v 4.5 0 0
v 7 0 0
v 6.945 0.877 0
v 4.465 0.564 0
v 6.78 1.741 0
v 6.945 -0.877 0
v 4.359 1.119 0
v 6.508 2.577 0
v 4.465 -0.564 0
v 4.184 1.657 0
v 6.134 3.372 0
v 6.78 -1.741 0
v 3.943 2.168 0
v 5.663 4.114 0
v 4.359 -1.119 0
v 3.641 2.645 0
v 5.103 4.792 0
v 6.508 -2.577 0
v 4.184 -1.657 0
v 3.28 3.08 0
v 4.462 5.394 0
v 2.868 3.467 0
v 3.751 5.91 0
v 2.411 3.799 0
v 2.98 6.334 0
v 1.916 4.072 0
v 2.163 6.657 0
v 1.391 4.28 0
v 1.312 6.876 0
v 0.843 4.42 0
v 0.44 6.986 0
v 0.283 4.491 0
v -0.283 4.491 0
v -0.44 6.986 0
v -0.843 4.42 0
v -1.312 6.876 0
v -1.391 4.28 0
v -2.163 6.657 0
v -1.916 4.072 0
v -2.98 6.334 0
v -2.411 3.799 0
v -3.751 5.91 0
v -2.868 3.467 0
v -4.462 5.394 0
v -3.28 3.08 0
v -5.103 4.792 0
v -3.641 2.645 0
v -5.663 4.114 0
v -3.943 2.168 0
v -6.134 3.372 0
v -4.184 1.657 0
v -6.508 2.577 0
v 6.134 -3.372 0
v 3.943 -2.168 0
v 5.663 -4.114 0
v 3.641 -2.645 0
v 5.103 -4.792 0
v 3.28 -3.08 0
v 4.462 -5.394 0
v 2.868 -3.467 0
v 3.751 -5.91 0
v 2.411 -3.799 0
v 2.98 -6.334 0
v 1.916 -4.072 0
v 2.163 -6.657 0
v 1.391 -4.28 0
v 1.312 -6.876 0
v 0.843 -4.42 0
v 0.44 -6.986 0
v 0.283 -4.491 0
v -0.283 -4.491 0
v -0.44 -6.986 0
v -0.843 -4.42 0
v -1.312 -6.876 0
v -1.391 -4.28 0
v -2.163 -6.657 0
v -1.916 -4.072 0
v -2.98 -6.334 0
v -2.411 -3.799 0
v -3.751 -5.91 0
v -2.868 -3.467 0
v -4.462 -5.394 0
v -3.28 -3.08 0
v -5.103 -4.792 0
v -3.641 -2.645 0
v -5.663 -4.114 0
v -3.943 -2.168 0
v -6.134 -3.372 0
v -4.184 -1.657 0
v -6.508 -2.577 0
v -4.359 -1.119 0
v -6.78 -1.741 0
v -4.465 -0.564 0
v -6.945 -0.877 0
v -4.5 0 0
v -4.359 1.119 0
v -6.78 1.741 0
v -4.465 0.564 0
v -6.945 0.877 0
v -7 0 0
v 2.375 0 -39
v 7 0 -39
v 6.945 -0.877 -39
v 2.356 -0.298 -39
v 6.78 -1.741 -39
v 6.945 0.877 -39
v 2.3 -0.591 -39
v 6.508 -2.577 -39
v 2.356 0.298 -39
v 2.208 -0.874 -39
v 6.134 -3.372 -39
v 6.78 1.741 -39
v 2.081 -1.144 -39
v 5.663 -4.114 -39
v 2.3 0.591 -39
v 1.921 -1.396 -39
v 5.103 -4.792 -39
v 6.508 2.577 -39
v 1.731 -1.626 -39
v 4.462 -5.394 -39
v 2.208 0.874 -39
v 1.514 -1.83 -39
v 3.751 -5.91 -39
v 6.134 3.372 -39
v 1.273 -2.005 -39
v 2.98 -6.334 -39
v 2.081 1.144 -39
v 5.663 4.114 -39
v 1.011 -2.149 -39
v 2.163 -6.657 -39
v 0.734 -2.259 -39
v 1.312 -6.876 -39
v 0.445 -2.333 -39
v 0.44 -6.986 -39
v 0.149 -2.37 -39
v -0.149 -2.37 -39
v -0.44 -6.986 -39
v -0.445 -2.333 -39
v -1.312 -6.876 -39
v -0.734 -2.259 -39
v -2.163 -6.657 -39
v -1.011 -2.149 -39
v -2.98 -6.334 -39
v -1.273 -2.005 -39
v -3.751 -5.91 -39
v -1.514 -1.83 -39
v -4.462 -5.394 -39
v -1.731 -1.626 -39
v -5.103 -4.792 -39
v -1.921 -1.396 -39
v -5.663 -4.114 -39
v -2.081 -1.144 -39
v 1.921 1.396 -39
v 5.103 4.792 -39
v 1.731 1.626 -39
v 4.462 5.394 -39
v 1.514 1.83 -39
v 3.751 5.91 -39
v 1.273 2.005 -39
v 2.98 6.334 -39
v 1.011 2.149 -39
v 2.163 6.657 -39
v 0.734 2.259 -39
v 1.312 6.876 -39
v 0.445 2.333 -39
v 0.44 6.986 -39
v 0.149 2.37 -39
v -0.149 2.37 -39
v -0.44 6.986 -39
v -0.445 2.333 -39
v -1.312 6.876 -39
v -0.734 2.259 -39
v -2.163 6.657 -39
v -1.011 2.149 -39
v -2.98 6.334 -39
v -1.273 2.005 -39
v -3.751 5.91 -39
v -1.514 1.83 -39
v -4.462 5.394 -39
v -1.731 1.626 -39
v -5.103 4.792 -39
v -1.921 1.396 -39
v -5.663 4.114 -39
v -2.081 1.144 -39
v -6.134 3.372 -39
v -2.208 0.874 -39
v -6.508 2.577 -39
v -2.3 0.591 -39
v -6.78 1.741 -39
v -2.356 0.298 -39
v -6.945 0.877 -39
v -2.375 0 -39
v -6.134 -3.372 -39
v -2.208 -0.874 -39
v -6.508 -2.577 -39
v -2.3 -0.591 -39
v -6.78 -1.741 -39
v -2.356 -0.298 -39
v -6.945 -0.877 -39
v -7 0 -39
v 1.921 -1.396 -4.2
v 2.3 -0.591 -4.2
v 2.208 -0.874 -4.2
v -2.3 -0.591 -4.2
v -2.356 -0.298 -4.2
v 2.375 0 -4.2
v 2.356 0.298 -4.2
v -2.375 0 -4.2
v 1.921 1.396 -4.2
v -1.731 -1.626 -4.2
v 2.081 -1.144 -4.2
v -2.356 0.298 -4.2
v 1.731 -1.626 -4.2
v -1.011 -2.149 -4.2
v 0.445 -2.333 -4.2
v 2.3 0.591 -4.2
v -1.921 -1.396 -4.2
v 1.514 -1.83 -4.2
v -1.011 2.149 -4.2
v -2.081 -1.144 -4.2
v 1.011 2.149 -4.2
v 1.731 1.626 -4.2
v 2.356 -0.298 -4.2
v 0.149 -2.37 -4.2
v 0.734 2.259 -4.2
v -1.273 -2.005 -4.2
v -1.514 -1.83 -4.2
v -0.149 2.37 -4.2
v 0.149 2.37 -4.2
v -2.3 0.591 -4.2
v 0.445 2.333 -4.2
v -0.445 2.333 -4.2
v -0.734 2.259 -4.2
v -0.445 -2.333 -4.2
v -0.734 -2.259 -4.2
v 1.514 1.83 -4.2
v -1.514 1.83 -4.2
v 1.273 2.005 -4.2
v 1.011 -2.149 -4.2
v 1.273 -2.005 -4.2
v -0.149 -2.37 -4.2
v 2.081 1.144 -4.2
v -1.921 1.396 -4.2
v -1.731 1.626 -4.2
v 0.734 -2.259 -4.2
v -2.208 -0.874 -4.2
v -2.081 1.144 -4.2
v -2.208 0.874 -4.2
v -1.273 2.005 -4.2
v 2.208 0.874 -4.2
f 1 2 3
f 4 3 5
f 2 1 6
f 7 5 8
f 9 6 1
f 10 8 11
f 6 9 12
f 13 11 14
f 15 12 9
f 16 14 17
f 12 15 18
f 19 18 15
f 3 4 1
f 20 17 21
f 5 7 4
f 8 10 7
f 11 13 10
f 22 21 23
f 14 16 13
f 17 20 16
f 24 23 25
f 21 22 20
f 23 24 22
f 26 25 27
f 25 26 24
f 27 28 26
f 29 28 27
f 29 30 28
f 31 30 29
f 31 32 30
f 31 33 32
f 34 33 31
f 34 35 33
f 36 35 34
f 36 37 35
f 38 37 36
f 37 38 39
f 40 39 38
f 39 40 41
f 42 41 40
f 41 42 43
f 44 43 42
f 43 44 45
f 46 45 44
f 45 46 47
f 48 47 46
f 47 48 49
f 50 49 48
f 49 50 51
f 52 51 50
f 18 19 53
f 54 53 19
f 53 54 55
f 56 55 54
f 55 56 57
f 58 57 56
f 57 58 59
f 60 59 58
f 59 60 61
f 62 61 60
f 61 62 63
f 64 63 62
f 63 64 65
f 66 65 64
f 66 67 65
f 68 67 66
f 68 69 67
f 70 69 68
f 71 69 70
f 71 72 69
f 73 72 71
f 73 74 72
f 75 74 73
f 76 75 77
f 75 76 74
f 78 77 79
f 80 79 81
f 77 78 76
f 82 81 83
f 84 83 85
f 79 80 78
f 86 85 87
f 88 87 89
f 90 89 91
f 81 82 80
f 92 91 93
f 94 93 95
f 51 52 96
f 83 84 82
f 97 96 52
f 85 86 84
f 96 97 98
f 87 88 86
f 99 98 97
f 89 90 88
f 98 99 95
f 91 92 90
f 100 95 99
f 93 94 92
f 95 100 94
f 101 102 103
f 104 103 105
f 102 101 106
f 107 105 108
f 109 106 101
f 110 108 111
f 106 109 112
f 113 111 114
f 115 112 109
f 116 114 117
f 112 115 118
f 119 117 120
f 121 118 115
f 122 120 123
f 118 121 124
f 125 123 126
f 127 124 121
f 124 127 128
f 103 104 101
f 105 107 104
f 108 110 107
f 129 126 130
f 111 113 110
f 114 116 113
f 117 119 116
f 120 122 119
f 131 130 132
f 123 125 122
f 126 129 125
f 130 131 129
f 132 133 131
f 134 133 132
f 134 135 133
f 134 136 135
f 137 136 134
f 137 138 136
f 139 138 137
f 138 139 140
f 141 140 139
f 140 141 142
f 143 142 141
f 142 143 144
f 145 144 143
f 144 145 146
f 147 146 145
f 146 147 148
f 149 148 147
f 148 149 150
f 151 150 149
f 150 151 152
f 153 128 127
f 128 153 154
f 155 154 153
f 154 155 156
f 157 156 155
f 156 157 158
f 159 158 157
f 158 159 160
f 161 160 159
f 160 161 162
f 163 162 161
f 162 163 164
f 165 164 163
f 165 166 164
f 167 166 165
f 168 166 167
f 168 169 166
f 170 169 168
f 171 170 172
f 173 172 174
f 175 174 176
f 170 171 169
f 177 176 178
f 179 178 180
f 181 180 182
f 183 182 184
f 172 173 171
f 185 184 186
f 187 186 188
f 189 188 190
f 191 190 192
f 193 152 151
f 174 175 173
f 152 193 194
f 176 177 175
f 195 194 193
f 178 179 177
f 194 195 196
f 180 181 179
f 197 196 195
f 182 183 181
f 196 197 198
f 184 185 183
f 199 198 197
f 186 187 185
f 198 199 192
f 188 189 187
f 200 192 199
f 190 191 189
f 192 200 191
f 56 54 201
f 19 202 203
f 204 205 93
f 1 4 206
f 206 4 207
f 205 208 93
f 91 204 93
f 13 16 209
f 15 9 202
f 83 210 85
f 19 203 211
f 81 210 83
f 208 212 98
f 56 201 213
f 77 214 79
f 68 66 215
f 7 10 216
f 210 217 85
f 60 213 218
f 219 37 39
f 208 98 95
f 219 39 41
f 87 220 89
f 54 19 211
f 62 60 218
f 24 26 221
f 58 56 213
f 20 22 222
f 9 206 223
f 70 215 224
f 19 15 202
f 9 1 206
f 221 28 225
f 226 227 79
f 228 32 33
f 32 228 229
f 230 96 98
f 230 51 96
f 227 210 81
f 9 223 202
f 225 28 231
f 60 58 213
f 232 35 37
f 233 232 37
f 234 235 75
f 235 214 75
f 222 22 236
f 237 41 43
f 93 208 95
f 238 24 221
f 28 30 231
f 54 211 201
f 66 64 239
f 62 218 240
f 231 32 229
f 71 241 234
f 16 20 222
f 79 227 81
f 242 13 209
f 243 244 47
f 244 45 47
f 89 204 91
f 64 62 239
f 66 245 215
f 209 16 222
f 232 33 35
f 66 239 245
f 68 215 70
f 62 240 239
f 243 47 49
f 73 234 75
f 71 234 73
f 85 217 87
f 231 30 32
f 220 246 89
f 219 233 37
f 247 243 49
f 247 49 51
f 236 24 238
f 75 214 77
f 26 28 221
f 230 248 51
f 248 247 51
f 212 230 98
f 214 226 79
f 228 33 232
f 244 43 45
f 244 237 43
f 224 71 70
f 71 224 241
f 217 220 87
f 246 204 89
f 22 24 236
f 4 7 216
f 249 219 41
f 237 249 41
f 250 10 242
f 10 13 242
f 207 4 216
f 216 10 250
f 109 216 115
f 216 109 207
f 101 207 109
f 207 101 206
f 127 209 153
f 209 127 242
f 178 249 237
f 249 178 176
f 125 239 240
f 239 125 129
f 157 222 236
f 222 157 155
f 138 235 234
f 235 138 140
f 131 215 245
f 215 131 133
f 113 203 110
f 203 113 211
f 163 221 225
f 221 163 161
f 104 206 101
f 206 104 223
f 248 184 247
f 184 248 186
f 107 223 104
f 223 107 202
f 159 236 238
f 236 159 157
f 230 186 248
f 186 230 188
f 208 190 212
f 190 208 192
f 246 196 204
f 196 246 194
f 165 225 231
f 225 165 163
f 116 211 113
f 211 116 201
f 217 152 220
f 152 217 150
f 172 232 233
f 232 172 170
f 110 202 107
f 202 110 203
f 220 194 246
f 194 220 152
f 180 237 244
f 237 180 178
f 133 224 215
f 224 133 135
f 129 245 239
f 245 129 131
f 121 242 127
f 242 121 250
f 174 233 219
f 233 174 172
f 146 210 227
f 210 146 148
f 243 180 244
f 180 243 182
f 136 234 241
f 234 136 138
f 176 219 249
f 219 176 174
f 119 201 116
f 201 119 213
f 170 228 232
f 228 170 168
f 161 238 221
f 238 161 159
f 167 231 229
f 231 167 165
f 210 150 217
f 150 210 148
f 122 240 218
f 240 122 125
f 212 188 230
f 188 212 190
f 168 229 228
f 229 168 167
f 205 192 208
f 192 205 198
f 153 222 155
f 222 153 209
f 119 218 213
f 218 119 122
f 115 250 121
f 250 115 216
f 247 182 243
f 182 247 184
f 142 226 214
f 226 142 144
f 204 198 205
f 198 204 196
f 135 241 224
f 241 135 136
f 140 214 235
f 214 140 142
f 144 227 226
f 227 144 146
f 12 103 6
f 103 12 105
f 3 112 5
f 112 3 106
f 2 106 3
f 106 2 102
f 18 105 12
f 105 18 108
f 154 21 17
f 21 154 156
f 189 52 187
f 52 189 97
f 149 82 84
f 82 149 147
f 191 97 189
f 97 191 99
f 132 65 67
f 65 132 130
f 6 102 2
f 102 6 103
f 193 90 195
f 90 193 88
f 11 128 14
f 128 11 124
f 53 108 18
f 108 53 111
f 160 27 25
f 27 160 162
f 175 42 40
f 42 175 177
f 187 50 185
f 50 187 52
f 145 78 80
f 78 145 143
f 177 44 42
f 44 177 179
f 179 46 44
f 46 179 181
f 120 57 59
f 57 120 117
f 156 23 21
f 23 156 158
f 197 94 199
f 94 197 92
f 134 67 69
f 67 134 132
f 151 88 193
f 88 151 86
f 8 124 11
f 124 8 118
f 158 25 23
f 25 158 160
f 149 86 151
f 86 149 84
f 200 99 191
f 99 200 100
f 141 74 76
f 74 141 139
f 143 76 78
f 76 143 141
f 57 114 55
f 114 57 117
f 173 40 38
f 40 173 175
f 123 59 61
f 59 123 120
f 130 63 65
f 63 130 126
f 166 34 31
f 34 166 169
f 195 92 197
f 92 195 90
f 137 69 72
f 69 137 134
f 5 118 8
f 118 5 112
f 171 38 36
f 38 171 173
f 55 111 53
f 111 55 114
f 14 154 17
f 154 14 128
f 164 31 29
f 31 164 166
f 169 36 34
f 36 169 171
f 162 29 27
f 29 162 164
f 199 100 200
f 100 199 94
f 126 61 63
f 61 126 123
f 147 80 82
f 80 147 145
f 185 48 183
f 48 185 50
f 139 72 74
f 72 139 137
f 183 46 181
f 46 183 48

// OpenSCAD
$fn = 50;


difference() {
	union() {
		translate(v = [0, 0, -39.0000000000]) {
			cylinder(h = 39, r = 7.0000000000);
		}
		cylinder(h = 0, r = 16.0000000000);
	}
	union() {
		translate(v = [0, 0, 0]) {
			rotate(a = [0, 0, 0]) {
				difference() {
					union() {
						#translate(v = [0, 0, -39.0000000000]) {
							cylinder(h = 39, r = 2.2500000000);
						}
						#translate(v = [0, 0, -4.2000000000]) {
							cylinder(h = 4.2000000000, r1 = 2.3750000000, r2 = 4.5000000000);
						}
						#translate(v = [0, 0, -39.0000000000]) {
							cylinder(h = 39, r = 2.3750000000);
						}
						#translate(v = [0, 0, -39.0000000000]) {
							cylinder(h = 39, r = 2.2500000000);
						}
					}
					union();
				}
			}
		}
	}
}
